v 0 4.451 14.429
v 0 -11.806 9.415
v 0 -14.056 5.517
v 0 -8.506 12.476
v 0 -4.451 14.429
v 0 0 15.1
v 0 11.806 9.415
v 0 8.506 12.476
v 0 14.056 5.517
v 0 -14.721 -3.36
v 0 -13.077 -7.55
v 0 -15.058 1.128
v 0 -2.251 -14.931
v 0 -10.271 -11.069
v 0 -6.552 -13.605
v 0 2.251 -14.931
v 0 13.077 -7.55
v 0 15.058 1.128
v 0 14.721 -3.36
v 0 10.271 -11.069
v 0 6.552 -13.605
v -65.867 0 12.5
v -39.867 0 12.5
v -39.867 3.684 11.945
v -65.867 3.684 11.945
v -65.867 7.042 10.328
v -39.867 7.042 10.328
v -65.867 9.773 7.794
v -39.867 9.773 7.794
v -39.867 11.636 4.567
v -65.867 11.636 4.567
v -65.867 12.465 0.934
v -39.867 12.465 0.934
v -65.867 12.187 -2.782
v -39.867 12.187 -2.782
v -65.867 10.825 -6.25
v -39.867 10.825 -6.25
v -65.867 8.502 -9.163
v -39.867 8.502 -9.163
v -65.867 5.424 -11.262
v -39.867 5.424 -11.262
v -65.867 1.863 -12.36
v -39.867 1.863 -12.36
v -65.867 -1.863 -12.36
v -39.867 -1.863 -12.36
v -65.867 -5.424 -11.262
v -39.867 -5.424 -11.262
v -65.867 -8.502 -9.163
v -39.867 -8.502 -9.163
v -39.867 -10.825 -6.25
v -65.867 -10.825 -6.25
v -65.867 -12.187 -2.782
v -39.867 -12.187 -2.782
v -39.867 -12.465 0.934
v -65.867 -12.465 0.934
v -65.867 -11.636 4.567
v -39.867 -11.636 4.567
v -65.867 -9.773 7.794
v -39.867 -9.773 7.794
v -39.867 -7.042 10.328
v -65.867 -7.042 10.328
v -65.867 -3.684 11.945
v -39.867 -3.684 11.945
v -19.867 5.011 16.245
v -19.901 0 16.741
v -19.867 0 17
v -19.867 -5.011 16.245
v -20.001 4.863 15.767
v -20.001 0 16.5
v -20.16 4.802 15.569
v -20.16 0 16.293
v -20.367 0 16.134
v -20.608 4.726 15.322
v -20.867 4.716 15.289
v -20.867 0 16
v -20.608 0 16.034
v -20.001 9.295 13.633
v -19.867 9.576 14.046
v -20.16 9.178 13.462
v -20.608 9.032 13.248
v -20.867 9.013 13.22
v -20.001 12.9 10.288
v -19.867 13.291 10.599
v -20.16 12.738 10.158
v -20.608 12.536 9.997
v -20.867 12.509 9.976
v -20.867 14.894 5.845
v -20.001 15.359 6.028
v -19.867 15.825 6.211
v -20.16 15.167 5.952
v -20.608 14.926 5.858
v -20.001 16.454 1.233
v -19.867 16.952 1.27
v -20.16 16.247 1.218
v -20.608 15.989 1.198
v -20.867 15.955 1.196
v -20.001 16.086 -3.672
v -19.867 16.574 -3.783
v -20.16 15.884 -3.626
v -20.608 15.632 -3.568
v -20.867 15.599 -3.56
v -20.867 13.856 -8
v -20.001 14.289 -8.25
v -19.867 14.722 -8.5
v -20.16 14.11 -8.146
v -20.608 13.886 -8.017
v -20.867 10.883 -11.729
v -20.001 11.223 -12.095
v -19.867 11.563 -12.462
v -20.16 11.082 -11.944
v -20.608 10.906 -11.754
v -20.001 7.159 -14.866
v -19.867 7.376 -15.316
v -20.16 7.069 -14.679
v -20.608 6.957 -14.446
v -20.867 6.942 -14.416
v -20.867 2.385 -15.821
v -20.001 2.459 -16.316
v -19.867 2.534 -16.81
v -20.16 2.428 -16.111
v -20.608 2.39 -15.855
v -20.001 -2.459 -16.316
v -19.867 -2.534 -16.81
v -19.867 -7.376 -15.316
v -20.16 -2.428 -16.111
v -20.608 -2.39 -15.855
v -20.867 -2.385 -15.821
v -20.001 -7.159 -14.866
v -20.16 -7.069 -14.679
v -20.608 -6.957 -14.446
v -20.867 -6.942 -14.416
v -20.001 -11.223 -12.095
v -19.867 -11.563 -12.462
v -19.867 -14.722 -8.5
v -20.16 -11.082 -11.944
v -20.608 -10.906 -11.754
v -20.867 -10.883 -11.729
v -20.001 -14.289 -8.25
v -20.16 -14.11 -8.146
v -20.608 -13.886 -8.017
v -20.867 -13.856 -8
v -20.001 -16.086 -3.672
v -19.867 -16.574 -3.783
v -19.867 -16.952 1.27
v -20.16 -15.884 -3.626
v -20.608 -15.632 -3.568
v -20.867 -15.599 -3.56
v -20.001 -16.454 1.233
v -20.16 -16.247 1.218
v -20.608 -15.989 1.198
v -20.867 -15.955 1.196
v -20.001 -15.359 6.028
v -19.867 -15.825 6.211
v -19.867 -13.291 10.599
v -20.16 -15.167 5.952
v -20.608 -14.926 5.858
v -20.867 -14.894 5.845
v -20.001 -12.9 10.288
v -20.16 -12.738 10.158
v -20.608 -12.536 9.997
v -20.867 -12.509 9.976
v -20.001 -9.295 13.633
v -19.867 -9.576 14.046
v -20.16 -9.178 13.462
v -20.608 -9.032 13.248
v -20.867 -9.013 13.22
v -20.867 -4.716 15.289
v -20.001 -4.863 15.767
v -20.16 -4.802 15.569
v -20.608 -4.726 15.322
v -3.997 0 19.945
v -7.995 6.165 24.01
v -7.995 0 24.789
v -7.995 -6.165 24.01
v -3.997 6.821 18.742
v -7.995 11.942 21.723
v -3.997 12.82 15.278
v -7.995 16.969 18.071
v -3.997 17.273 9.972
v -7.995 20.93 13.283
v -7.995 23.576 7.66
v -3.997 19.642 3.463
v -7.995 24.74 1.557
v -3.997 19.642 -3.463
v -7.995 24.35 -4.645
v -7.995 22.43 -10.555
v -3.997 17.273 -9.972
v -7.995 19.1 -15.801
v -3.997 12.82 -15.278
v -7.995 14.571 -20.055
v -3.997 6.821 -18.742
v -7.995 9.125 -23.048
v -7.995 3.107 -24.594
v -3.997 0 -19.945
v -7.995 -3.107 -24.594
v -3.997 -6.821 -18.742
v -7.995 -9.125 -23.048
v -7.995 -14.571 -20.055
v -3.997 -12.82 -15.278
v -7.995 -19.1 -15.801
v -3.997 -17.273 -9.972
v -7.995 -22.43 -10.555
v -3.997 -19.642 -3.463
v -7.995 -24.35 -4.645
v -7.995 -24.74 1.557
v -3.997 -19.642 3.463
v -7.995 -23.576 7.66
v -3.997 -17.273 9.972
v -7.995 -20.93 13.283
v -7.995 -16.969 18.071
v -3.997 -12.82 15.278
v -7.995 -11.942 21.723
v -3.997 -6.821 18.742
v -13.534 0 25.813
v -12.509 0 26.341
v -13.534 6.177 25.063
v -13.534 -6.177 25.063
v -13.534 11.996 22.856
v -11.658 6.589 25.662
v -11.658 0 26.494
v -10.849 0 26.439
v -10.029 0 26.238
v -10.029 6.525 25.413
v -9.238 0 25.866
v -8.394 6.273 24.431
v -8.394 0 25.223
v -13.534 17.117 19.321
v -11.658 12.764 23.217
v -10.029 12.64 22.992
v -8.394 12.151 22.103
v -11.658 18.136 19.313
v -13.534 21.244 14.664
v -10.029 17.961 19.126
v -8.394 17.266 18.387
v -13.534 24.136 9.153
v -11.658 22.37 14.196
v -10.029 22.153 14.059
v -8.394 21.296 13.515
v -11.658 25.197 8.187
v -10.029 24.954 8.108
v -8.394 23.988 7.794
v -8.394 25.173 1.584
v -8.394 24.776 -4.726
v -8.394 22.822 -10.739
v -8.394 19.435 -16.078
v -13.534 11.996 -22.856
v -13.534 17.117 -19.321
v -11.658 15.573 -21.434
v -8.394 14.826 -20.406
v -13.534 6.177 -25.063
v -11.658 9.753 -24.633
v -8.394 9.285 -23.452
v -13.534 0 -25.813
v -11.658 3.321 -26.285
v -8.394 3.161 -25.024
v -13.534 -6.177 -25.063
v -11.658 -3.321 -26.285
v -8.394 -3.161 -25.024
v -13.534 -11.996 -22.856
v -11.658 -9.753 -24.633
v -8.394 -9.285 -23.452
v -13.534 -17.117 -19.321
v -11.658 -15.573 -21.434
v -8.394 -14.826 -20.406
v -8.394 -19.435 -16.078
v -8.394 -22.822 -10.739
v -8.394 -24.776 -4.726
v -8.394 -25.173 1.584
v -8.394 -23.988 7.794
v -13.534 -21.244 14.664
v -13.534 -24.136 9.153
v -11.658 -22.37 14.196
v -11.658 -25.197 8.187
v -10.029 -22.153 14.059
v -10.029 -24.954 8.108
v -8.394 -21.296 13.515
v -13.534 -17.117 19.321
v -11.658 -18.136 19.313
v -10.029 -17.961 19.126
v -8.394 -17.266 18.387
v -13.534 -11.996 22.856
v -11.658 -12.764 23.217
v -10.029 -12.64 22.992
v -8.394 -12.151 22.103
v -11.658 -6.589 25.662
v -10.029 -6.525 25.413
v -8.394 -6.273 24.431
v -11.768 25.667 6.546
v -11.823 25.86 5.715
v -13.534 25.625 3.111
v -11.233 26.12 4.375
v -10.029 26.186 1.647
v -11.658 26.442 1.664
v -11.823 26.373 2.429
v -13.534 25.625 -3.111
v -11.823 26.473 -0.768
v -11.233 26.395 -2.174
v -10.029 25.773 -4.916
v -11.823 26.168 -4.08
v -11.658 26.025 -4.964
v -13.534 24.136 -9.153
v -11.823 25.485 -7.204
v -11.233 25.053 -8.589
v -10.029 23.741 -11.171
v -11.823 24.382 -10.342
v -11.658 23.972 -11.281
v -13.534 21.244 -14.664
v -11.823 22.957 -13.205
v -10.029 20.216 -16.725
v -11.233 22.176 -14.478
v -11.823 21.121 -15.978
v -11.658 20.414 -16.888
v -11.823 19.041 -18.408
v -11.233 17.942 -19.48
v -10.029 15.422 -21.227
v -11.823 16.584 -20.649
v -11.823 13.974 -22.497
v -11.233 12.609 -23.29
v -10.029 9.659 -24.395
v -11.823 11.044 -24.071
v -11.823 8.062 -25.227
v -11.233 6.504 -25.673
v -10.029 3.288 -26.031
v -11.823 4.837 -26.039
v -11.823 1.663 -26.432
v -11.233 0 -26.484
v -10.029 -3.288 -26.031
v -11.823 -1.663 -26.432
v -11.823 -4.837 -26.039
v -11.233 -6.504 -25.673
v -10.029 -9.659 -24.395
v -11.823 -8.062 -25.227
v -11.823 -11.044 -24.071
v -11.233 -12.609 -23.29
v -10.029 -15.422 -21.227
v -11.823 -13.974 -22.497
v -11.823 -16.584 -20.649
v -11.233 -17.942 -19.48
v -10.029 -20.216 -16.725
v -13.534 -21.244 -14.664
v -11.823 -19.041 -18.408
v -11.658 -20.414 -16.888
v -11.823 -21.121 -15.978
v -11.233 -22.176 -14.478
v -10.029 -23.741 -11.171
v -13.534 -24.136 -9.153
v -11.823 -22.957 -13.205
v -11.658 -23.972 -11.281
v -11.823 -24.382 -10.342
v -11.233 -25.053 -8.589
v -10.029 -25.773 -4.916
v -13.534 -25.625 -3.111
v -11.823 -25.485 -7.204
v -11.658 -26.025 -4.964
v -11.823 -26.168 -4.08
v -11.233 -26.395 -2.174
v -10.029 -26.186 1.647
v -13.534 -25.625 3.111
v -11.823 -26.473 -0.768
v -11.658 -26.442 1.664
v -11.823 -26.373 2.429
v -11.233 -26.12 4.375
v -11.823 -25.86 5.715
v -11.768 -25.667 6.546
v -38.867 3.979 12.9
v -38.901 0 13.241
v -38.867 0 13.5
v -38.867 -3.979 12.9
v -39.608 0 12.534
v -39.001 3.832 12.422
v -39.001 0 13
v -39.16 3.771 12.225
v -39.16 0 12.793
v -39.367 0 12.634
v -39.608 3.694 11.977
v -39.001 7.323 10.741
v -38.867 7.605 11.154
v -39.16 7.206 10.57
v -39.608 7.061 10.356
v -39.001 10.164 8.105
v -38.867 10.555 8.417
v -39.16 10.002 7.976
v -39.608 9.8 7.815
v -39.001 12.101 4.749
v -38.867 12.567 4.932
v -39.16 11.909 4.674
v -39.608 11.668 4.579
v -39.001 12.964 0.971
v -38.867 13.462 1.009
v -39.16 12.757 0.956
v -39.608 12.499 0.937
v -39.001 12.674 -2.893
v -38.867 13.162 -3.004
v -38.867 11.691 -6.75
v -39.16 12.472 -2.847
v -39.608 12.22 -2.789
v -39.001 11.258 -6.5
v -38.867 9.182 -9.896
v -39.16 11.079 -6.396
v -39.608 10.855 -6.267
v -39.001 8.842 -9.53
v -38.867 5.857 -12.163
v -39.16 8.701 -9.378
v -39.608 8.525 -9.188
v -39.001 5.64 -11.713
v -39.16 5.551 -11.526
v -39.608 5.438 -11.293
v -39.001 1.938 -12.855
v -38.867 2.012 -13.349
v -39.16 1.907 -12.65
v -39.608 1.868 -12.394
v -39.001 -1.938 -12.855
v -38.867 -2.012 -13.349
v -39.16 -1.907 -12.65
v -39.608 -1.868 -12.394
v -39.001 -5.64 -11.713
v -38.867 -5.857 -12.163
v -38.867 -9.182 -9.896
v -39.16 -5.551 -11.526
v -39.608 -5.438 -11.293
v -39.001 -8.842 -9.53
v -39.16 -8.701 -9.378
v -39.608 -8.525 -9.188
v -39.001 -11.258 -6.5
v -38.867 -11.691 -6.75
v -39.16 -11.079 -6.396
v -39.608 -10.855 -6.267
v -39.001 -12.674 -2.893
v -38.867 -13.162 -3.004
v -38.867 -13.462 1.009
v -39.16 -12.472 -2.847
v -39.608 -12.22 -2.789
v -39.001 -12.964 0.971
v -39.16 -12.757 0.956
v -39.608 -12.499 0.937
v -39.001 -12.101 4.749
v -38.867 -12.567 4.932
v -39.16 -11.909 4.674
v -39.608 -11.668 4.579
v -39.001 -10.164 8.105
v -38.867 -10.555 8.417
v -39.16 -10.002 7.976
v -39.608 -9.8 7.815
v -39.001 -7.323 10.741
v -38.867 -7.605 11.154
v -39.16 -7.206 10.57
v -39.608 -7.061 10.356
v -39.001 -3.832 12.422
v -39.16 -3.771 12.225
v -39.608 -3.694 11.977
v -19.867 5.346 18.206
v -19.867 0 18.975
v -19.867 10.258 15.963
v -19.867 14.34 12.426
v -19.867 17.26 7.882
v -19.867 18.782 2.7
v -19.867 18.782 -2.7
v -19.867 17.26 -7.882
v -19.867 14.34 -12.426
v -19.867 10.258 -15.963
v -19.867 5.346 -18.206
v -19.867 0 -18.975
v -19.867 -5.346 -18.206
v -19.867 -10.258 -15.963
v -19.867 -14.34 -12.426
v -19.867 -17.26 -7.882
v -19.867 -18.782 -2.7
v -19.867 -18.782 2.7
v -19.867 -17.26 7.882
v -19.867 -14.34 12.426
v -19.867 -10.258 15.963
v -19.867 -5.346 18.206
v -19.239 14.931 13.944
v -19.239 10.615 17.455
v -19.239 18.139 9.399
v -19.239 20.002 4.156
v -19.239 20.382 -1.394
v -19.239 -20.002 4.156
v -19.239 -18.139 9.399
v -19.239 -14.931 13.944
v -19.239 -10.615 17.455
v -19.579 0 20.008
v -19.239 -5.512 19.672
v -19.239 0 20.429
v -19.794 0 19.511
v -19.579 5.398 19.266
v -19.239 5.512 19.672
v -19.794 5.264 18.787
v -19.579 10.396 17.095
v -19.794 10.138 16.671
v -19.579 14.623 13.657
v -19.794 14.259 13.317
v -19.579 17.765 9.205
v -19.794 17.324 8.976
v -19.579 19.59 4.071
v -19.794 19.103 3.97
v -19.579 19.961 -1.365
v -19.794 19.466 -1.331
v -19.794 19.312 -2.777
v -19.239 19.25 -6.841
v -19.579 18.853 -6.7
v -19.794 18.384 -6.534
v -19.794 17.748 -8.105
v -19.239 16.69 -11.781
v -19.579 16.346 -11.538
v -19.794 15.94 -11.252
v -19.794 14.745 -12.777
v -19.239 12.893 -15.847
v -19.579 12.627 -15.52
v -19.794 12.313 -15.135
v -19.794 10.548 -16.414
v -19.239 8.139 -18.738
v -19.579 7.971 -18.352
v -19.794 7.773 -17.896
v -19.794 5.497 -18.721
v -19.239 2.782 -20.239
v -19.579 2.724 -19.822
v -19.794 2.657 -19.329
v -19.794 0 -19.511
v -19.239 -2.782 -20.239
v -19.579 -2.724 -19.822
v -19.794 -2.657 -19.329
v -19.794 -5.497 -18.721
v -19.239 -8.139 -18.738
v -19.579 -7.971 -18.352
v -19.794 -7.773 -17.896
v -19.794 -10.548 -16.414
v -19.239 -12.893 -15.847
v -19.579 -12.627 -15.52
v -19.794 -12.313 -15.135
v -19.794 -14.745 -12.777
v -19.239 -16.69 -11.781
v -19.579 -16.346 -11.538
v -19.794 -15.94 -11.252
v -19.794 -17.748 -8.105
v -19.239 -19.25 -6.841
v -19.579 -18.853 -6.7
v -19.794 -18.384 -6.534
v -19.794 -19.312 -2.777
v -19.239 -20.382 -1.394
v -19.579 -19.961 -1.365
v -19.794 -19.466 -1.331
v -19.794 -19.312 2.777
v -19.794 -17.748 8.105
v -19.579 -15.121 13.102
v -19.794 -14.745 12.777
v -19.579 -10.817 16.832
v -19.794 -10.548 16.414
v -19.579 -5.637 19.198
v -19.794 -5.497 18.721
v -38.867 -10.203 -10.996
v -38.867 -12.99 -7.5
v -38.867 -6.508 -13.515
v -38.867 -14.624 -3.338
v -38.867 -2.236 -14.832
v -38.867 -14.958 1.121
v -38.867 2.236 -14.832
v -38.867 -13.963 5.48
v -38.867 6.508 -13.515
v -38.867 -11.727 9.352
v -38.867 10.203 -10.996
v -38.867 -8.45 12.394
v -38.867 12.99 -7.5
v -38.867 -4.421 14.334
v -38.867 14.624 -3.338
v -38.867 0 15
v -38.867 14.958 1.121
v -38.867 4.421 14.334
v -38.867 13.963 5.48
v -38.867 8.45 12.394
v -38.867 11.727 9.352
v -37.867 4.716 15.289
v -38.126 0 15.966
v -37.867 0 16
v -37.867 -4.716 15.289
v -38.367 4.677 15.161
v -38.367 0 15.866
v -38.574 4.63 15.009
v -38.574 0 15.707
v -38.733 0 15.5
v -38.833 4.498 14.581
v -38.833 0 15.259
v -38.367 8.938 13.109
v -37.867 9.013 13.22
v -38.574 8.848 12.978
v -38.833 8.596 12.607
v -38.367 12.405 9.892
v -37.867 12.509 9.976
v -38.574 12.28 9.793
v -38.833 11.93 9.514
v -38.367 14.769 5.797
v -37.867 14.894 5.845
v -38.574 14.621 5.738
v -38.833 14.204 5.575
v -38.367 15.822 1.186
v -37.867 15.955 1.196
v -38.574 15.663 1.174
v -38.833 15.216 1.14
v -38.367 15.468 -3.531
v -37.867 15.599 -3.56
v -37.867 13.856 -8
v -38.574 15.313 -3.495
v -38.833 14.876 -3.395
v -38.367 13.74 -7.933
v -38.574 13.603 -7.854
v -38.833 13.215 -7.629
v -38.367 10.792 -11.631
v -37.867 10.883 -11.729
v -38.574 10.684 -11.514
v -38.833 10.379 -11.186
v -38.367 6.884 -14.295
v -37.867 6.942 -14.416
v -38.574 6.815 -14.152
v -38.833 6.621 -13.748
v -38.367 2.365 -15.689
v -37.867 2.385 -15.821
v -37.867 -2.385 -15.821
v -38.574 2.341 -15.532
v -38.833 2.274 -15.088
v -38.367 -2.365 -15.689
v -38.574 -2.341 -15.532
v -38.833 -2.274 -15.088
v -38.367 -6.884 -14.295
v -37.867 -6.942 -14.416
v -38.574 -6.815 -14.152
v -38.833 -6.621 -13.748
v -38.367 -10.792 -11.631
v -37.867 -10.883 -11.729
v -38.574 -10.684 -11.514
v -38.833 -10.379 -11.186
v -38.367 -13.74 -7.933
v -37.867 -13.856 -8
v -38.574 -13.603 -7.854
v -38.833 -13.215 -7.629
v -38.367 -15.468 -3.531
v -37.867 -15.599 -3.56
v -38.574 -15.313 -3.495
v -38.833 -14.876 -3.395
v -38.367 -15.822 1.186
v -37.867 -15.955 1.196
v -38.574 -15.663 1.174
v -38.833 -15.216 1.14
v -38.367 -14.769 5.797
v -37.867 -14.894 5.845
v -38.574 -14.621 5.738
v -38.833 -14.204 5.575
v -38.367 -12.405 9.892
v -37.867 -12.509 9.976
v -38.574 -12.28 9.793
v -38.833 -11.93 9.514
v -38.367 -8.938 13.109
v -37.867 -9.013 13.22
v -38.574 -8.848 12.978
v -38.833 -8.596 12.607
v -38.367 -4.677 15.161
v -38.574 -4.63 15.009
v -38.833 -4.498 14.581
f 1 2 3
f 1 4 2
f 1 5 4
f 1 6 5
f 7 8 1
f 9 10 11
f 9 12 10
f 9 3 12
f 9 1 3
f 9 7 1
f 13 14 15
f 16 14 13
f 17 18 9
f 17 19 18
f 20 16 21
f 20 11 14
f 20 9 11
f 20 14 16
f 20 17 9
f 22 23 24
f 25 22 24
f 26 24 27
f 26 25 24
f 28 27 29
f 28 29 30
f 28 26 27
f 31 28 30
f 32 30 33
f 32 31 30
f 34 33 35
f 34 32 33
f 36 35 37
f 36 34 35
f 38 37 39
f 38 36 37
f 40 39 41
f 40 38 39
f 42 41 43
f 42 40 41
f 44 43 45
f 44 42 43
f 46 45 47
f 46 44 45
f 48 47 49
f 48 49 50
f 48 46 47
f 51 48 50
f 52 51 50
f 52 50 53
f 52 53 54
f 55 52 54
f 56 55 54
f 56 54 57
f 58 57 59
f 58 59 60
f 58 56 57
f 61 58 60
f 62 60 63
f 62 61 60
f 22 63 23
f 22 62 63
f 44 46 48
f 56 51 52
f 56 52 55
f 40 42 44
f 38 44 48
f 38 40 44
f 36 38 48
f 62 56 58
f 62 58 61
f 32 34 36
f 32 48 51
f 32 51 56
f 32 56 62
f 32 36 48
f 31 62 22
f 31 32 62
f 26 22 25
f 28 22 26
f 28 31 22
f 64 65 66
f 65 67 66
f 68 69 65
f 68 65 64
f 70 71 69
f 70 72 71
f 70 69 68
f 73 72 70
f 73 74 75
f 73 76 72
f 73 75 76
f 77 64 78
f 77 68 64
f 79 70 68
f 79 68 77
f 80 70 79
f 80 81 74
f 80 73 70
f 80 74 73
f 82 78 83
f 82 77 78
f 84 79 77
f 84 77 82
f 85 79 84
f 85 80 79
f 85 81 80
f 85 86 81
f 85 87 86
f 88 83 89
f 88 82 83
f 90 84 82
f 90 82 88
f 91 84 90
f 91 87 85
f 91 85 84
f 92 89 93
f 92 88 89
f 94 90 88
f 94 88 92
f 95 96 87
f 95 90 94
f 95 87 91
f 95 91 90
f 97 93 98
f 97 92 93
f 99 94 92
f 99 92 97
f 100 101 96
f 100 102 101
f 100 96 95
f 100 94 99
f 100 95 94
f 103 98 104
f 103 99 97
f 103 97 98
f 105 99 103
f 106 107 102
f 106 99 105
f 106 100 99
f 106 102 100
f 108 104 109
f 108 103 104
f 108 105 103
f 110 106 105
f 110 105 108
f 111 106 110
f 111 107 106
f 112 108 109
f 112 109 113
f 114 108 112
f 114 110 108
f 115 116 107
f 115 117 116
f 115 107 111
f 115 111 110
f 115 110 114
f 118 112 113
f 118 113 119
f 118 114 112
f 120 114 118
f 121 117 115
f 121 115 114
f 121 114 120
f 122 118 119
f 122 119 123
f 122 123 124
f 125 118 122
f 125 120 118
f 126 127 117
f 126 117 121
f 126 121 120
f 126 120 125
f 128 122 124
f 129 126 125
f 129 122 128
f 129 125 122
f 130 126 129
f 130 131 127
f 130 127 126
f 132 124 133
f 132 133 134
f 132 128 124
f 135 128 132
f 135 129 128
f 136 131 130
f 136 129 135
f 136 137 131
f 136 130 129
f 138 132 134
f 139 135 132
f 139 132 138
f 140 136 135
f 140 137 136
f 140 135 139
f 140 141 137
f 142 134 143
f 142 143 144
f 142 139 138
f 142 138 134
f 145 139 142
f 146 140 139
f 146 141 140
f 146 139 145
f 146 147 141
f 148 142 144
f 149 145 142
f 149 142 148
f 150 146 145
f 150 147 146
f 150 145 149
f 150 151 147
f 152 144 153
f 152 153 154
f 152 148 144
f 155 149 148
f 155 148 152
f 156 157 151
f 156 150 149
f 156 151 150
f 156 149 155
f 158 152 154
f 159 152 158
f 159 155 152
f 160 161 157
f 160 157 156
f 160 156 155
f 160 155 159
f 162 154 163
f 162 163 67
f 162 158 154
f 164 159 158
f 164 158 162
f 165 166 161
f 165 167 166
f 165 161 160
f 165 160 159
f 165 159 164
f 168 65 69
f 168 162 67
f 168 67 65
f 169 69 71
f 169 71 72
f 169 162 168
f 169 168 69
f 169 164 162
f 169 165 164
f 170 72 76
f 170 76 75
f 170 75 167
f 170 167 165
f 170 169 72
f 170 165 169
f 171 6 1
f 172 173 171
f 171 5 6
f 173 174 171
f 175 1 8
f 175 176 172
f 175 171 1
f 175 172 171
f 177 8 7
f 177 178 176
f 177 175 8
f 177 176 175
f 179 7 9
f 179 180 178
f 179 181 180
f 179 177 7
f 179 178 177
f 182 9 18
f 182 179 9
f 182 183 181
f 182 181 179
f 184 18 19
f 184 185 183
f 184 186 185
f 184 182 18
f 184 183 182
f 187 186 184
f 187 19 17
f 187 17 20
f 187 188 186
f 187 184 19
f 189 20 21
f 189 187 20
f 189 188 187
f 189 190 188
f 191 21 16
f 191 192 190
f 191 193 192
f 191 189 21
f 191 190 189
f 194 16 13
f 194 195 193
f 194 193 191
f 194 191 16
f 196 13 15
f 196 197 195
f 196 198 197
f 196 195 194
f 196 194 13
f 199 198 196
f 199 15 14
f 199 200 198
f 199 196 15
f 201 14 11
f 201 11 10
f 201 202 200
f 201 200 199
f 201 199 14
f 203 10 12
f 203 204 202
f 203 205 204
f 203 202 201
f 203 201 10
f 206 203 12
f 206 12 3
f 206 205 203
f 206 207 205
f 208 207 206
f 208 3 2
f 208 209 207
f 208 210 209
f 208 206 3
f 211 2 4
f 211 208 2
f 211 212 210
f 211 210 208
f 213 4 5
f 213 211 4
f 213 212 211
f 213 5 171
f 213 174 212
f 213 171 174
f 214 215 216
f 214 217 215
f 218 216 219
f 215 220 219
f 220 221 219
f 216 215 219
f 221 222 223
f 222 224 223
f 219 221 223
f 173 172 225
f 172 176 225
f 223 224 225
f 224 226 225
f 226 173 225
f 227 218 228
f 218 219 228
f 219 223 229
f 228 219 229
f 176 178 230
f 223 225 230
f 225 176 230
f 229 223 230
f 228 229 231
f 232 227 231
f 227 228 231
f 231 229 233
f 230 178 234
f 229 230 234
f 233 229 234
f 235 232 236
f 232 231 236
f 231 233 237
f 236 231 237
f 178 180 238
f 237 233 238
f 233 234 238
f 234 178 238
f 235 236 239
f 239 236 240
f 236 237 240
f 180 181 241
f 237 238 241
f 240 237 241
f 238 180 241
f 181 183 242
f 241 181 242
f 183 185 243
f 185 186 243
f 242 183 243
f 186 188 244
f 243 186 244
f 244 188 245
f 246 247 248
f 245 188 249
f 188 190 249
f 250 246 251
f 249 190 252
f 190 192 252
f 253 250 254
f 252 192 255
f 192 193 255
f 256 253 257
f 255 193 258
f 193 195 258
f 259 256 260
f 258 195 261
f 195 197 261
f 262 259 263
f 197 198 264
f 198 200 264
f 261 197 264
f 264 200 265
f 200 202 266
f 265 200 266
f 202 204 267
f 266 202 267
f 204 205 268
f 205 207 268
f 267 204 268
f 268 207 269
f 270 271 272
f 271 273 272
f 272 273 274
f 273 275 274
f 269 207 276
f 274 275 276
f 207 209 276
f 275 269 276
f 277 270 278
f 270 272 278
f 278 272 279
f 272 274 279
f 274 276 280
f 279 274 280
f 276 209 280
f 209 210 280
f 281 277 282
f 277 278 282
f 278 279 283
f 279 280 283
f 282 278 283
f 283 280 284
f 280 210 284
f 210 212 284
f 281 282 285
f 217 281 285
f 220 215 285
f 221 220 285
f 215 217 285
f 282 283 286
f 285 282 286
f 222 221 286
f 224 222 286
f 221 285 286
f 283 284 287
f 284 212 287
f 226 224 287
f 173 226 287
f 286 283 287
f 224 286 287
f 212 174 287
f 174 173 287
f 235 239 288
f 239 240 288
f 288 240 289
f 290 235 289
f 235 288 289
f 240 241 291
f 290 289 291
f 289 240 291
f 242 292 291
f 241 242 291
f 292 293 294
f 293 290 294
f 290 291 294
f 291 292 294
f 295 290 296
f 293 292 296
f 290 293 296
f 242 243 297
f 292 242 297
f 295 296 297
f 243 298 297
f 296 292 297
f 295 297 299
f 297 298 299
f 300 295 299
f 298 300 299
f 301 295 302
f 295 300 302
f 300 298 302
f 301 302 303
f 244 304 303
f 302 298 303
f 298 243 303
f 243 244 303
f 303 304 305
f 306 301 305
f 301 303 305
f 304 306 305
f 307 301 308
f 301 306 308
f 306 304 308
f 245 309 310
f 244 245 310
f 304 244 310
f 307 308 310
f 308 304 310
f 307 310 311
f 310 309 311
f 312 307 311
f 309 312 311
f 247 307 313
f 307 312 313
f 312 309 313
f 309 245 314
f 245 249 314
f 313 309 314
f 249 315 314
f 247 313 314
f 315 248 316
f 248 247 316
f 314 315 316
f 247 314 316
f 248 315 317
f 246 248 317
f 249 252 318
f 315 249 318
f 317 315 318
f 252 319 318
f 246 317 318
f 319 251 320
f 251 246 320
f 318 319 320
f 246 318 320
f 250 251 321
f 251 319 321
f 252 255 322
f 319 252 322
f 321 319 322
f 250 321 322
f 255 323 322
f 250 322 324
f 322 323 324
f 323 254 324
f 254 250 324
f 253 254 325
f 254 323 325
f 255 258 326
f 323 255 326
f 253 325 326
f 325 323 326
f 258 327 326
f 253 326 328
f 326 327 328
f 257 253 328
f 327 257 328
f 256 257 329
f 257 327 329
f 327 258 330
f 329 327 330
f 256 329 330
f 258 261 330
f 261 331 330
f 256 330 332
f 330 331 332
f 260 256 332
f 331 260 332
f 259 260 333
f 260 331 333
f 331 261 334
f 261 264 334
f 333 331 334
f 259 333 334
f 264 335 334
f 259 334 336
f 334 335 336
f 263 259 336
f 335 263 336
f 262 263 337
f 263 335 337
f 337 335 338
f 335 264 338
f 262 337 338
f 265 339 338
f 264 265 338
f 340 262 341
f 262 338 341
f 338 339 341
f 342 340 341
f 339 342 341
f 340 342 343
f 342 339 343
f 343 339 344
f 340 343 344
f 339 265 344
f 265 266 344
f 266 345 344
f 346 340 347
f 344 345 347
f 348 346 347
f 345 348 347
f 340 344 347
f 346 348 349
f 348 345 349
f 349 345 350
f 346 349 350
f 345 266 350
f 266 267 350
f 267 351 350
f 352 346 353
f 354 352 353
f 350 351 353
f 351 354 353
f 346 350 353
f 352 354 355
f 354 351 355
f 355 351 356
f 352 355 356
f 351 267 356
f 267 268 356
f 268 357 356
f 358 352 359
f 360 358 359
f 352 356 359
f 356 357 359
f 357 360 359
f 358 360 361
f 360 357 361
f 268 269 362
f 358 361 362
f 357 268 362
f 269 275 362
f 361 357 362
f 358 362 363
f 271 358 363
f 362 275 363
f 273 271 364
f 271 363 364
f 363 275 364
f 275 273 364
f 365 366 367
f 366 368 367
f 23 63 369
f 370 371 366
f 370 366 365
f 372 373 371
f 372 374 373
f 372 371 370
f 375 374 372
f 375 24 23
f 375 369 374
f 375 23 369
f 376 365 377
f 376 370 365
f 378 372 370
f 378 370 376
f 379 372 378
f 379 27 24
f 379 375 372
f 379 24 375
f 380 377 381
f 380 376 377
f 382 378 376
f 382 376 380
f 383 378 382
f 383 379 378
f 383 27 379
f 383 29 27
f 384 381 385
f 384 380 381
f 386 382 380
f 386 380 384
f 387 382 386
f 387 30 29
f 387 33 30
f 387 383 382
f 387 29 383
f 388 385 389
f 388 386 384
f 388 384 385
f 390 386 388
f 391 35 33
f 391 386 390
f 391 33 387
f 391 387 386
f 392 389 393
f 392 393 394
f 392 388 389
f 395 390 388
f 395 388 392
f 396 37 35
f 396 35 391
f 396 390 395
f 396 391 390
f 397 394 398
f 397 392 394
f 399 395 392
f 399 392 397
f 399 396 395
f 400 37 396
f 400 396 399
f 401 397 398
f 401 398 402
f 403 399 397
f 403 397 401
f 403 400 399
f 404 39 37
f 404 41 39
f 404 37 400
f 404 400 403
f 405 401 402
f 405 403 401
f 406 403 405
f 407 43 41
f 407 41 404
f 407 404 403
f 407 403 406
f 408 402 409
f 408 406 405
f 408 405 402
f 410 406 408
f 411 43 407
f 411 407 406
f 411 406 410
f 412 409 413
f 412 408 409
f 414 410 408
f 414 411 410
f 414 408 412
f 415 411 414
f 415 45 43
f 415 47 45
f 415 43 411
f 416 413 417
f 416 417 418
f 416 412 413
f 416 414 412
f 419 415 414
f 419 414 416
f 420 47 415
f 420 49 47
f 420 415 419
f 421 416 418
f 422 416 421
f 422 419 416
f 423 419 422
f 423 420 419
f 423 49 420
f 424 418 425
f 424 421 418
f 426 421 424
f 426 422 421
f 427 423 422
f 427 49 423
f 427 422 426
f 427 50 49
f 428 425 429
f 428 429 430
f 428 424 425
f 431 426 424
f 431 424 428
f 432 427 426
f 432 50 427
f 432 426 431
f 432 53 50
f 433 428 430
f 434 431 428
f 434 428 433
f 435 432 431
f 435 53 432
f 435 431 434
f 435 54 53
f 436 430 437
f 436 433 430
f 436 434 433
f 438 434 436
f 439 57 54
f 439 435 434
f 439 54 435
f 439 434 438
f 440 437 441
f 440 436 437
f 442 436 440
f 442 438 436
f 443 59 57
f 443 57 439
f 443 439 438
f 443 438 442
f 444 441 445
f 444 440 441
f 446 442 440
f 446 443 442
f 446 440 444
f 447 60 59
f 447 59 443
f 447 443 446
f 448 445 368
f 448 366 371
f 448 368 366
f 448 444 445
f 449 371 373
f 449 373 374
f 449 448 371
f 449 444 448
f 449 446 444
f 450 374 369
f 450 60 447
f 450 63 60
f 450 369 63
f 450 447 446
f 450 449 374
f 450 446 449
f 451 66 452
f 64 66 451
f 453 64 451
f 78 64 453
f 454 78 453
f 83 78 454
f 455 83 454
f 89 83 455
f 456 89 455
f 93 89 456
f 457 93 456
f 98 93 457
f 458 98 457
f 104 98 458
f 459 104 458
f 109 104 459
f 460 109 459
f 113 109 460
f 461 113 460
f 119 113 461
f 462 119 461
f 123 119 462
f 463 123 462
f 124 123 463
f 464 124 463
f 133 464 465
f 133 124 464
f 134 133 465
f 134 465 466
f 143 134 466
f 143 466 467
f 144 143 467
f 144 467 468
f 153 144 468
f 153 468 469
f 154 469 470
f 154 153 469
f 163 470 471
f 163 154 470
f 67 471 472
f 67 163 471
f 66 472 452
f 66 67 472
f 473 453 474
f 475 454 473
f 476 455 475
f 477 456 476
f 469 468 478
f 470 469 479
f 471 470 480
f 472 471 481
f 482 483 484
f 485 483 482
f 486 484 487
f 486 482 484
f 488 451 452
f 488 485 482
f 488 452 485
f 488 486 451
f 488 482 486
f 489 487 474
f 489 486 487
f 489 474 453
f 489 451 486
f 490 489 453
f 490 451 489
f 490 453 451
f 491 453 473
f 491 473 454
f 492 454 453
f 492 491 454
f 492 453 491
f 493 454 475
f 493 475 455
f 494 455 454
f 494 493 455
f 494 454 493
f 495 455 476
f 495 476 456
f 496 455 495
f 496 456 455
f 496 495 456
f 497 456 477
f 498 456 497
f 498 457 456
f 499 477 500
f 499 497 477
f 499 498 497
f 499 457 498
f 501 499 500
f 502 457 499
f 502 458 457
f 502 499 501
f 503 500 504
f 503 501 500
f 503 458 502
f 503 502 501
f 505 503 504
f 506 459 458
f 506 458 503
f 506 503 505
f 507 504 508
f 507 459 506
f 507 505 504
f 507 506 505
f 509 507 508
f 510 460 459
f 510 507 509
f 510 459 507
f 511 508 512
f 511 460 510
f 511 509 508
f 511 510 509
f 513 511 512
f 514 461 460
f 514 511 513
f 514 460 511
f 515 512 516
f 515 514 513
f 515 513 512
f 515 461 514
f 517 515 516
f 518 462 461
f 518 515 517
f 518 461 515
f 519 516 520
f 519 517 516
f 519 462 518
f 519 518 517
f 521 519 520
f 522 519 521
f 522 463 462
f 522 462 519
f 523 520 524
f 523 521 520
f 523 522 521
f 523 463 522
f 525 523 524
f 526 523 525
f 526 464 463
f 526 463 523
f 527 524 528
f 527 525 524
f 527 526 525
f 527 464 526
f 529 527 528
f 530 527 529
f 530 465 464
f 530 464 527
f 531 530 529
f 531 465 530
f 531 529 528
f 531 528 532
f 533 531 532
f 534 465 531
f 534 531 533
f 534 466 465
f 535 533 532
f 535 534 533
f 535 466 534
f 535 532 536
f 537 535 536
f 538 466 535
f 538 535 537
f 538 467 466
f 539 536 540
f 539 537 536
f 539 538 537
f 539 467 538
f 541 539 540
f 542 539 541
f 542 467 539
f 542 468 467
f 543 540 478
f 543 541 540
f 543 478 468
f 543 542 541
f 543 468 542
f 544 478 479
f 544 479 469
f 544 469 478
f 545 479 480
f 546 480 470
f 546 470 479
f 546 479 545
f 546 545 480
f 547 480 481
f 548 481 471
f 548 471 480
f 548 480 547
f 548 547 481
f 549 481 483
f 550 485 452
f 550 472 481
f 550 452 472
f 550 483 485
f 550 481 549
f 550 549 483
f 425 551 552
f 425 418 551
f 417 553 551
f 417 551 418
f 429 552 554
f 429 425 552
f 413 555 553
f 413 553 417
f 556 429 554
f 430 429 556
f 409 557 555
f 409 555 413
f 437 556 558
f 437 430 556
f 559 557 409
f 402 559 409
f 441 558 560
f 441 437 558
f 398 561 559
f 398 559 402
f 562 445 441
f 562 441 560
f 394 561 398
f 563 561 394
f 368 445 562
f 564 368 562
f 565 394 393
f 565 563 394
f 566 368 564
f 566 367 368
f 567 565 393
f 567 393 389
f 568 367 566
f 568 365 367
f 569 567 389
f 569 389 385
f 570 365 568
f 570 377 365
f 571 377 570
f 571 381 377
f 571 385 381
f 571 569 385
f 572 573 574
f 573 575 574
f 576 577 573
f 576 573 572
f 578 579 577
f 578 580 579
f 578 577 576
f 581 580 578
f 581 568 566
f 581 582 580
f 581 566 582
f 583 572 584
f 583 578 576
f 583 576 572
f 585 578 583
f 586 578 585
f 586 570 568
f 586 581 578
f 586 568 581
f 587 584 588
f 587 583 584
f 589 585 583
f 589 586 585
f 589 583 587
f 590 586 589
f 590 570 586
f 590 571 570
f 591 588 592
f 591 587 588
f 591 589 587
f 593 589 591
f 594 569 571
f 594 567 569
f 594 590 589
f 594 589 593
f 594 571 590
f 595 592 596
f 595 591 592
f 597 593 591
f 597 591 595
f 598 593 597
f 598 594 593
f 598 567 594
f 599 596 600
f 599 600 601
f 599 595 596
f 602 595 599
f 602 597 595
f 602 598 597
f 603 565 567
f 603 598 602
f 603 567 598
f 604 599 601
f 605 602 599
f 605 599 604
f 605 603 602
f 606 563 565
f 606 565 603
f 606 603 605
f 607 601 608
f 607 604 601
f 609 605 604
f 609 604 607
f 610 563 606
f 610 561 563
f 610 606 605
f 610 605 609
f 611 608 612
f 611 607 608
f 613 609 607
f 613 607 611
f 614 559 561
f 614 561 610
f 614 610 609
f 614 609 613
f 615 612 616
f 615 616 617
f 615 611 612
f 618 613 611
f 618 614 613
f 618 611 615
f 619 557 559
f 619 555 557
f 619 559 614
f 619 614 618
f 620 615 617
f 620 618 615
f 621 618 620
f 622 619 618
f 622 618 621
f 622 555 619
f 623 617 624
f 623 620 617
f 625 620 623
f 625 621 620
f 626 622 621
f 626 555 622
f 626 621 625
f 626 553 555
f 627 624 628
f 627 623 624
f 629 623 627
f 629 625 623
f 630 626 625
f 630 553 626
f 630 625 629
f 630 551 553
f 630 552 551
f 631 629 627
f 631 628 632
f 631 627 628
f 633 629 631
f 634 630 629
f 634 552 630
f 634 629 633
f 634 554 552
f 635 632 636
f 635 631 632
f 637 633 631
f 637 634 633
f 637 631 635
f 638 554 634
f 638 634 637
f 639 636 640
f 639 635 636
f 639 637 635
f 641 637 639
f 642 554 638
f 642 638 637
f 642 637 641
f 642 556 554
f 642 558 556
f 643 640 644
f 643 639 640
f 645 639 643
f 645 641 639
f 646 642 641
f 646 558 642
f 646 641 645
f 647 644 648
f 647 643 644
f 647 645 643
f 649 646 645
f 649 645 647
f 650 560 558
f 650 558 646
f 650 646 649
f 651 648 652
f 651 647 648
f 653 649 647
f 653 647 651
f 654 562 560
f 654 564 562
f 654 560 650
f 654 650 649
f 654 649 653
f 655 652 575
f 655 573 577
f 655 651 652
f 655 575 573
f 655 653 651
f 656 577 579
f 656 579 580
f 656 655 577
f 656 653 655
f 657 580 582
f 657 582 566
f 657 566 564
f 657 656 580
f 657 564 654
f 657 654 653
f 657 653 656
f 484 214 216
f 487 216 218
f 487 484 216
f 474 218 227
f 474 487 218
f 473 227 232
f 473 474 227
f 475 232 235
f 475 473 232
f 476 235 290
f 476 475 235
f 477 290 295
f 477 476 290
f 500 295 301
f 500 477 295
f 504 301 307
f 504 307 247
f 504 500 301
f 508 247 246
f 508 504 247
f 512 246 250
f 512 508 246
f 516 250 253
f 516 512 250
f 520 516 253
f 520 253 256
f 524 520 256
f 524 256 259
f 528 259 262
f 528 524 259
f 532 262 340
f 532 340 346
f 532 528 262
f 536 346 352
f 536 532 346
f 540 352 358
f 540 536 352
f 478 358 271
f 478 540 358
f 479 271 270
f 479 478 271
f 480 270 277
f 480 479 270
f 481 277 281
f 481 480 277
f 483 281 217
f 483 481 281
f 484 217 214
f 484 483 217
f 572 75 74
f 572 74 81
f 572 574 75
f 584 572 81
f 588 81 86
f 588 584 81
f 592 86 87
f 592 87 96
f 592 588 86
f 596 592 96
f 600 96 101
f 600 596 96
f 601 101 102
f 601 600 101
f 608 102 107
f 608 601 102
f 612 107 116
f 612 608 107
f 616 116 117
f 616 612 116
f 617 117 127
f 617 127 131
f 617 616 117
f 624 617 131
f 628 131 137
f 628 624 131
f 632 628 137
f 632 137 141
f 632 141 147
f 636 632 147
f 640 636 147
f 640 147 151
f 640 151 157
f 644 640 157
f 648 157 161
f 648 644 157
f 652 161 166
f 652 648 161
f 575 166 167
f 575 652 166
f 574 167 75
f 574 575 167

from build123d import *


with BuildPart() as f1:
    # F0 (on Front) → F1 (revolve)
    with BuildSketch(Plane.XZ):
        with BuildLine():
            Line((0, 15.100086289), (-7.9947902337, 24.7891377658))
            add(Edge.make_bspline(
                [(-13.5336209388, 25.8130880211), (-13.1794829922, 26.0396653478), (-12.3469790571, 26.5077257402), (-10.9534140953, 26.5328921513), (-9.365299038, 26.0844114305), (-8.2402056984, 25.1083988869), (-8.0565123354, 24.8694320839), (-7.9947902337, 24.7891377658)],
                knots=[0.0753740232, 0.0753740232, 0.0753740232, 0.0753740232, 0.236653892, 0.4524170896, 0.6819552068, 0.89313499, 1, 1, 1, 1], degree=3))
            Line((-13.5336209388, 25.8130880211), (-19.239403379, 20.4293505417))
            ThreePointArc((-19.239403379, 20.4293505417), (-19.7032923995, 19.7667886958), (-19.8668379088, 18.9746813235))
            Line((-19.8668379088, 18.9746813235), (-19.8668367383, 17.0000005928))
            ThreePointArc((-19.8668367383, 17.0000005928), (-20.1597297475, 16.2928934284), (-20.8668367383, 16))
            Line((-20.8668367383, 16), (-37.8668361455, 16))
            ThreePointArc((-37.8668361455, 16), (-38.5739429267, 15.7071067812), (-38.8668361455, 15))
            Line((-38.8668361455, 15), (-38.8668361455, 13.5))
            ThreePointArc((-38.8668361455, 13.5), (-39.1597293643, 12.7928932188), (-39.8668361455, 12.5))
            Line((-39.8668361455, 12.5), (-65.8668361455, 12.5))
            Line((-65.8668361455, 12.5), (-65.8668361455, 0))
            Line((-65.8668361455, 0), (-26.8668361455, 0))
            Line((-26.8668361455, 0), (-19.8668361455, 0))
            Line((-19.8668361455, 0), (0, 0))
            Line((0, 0), (0, 15.100086289))
        make_face()
    revolve(axis=Axis((-46.3668361455, 0, 0), (-1, 0, 0)))


solid = f1.part
